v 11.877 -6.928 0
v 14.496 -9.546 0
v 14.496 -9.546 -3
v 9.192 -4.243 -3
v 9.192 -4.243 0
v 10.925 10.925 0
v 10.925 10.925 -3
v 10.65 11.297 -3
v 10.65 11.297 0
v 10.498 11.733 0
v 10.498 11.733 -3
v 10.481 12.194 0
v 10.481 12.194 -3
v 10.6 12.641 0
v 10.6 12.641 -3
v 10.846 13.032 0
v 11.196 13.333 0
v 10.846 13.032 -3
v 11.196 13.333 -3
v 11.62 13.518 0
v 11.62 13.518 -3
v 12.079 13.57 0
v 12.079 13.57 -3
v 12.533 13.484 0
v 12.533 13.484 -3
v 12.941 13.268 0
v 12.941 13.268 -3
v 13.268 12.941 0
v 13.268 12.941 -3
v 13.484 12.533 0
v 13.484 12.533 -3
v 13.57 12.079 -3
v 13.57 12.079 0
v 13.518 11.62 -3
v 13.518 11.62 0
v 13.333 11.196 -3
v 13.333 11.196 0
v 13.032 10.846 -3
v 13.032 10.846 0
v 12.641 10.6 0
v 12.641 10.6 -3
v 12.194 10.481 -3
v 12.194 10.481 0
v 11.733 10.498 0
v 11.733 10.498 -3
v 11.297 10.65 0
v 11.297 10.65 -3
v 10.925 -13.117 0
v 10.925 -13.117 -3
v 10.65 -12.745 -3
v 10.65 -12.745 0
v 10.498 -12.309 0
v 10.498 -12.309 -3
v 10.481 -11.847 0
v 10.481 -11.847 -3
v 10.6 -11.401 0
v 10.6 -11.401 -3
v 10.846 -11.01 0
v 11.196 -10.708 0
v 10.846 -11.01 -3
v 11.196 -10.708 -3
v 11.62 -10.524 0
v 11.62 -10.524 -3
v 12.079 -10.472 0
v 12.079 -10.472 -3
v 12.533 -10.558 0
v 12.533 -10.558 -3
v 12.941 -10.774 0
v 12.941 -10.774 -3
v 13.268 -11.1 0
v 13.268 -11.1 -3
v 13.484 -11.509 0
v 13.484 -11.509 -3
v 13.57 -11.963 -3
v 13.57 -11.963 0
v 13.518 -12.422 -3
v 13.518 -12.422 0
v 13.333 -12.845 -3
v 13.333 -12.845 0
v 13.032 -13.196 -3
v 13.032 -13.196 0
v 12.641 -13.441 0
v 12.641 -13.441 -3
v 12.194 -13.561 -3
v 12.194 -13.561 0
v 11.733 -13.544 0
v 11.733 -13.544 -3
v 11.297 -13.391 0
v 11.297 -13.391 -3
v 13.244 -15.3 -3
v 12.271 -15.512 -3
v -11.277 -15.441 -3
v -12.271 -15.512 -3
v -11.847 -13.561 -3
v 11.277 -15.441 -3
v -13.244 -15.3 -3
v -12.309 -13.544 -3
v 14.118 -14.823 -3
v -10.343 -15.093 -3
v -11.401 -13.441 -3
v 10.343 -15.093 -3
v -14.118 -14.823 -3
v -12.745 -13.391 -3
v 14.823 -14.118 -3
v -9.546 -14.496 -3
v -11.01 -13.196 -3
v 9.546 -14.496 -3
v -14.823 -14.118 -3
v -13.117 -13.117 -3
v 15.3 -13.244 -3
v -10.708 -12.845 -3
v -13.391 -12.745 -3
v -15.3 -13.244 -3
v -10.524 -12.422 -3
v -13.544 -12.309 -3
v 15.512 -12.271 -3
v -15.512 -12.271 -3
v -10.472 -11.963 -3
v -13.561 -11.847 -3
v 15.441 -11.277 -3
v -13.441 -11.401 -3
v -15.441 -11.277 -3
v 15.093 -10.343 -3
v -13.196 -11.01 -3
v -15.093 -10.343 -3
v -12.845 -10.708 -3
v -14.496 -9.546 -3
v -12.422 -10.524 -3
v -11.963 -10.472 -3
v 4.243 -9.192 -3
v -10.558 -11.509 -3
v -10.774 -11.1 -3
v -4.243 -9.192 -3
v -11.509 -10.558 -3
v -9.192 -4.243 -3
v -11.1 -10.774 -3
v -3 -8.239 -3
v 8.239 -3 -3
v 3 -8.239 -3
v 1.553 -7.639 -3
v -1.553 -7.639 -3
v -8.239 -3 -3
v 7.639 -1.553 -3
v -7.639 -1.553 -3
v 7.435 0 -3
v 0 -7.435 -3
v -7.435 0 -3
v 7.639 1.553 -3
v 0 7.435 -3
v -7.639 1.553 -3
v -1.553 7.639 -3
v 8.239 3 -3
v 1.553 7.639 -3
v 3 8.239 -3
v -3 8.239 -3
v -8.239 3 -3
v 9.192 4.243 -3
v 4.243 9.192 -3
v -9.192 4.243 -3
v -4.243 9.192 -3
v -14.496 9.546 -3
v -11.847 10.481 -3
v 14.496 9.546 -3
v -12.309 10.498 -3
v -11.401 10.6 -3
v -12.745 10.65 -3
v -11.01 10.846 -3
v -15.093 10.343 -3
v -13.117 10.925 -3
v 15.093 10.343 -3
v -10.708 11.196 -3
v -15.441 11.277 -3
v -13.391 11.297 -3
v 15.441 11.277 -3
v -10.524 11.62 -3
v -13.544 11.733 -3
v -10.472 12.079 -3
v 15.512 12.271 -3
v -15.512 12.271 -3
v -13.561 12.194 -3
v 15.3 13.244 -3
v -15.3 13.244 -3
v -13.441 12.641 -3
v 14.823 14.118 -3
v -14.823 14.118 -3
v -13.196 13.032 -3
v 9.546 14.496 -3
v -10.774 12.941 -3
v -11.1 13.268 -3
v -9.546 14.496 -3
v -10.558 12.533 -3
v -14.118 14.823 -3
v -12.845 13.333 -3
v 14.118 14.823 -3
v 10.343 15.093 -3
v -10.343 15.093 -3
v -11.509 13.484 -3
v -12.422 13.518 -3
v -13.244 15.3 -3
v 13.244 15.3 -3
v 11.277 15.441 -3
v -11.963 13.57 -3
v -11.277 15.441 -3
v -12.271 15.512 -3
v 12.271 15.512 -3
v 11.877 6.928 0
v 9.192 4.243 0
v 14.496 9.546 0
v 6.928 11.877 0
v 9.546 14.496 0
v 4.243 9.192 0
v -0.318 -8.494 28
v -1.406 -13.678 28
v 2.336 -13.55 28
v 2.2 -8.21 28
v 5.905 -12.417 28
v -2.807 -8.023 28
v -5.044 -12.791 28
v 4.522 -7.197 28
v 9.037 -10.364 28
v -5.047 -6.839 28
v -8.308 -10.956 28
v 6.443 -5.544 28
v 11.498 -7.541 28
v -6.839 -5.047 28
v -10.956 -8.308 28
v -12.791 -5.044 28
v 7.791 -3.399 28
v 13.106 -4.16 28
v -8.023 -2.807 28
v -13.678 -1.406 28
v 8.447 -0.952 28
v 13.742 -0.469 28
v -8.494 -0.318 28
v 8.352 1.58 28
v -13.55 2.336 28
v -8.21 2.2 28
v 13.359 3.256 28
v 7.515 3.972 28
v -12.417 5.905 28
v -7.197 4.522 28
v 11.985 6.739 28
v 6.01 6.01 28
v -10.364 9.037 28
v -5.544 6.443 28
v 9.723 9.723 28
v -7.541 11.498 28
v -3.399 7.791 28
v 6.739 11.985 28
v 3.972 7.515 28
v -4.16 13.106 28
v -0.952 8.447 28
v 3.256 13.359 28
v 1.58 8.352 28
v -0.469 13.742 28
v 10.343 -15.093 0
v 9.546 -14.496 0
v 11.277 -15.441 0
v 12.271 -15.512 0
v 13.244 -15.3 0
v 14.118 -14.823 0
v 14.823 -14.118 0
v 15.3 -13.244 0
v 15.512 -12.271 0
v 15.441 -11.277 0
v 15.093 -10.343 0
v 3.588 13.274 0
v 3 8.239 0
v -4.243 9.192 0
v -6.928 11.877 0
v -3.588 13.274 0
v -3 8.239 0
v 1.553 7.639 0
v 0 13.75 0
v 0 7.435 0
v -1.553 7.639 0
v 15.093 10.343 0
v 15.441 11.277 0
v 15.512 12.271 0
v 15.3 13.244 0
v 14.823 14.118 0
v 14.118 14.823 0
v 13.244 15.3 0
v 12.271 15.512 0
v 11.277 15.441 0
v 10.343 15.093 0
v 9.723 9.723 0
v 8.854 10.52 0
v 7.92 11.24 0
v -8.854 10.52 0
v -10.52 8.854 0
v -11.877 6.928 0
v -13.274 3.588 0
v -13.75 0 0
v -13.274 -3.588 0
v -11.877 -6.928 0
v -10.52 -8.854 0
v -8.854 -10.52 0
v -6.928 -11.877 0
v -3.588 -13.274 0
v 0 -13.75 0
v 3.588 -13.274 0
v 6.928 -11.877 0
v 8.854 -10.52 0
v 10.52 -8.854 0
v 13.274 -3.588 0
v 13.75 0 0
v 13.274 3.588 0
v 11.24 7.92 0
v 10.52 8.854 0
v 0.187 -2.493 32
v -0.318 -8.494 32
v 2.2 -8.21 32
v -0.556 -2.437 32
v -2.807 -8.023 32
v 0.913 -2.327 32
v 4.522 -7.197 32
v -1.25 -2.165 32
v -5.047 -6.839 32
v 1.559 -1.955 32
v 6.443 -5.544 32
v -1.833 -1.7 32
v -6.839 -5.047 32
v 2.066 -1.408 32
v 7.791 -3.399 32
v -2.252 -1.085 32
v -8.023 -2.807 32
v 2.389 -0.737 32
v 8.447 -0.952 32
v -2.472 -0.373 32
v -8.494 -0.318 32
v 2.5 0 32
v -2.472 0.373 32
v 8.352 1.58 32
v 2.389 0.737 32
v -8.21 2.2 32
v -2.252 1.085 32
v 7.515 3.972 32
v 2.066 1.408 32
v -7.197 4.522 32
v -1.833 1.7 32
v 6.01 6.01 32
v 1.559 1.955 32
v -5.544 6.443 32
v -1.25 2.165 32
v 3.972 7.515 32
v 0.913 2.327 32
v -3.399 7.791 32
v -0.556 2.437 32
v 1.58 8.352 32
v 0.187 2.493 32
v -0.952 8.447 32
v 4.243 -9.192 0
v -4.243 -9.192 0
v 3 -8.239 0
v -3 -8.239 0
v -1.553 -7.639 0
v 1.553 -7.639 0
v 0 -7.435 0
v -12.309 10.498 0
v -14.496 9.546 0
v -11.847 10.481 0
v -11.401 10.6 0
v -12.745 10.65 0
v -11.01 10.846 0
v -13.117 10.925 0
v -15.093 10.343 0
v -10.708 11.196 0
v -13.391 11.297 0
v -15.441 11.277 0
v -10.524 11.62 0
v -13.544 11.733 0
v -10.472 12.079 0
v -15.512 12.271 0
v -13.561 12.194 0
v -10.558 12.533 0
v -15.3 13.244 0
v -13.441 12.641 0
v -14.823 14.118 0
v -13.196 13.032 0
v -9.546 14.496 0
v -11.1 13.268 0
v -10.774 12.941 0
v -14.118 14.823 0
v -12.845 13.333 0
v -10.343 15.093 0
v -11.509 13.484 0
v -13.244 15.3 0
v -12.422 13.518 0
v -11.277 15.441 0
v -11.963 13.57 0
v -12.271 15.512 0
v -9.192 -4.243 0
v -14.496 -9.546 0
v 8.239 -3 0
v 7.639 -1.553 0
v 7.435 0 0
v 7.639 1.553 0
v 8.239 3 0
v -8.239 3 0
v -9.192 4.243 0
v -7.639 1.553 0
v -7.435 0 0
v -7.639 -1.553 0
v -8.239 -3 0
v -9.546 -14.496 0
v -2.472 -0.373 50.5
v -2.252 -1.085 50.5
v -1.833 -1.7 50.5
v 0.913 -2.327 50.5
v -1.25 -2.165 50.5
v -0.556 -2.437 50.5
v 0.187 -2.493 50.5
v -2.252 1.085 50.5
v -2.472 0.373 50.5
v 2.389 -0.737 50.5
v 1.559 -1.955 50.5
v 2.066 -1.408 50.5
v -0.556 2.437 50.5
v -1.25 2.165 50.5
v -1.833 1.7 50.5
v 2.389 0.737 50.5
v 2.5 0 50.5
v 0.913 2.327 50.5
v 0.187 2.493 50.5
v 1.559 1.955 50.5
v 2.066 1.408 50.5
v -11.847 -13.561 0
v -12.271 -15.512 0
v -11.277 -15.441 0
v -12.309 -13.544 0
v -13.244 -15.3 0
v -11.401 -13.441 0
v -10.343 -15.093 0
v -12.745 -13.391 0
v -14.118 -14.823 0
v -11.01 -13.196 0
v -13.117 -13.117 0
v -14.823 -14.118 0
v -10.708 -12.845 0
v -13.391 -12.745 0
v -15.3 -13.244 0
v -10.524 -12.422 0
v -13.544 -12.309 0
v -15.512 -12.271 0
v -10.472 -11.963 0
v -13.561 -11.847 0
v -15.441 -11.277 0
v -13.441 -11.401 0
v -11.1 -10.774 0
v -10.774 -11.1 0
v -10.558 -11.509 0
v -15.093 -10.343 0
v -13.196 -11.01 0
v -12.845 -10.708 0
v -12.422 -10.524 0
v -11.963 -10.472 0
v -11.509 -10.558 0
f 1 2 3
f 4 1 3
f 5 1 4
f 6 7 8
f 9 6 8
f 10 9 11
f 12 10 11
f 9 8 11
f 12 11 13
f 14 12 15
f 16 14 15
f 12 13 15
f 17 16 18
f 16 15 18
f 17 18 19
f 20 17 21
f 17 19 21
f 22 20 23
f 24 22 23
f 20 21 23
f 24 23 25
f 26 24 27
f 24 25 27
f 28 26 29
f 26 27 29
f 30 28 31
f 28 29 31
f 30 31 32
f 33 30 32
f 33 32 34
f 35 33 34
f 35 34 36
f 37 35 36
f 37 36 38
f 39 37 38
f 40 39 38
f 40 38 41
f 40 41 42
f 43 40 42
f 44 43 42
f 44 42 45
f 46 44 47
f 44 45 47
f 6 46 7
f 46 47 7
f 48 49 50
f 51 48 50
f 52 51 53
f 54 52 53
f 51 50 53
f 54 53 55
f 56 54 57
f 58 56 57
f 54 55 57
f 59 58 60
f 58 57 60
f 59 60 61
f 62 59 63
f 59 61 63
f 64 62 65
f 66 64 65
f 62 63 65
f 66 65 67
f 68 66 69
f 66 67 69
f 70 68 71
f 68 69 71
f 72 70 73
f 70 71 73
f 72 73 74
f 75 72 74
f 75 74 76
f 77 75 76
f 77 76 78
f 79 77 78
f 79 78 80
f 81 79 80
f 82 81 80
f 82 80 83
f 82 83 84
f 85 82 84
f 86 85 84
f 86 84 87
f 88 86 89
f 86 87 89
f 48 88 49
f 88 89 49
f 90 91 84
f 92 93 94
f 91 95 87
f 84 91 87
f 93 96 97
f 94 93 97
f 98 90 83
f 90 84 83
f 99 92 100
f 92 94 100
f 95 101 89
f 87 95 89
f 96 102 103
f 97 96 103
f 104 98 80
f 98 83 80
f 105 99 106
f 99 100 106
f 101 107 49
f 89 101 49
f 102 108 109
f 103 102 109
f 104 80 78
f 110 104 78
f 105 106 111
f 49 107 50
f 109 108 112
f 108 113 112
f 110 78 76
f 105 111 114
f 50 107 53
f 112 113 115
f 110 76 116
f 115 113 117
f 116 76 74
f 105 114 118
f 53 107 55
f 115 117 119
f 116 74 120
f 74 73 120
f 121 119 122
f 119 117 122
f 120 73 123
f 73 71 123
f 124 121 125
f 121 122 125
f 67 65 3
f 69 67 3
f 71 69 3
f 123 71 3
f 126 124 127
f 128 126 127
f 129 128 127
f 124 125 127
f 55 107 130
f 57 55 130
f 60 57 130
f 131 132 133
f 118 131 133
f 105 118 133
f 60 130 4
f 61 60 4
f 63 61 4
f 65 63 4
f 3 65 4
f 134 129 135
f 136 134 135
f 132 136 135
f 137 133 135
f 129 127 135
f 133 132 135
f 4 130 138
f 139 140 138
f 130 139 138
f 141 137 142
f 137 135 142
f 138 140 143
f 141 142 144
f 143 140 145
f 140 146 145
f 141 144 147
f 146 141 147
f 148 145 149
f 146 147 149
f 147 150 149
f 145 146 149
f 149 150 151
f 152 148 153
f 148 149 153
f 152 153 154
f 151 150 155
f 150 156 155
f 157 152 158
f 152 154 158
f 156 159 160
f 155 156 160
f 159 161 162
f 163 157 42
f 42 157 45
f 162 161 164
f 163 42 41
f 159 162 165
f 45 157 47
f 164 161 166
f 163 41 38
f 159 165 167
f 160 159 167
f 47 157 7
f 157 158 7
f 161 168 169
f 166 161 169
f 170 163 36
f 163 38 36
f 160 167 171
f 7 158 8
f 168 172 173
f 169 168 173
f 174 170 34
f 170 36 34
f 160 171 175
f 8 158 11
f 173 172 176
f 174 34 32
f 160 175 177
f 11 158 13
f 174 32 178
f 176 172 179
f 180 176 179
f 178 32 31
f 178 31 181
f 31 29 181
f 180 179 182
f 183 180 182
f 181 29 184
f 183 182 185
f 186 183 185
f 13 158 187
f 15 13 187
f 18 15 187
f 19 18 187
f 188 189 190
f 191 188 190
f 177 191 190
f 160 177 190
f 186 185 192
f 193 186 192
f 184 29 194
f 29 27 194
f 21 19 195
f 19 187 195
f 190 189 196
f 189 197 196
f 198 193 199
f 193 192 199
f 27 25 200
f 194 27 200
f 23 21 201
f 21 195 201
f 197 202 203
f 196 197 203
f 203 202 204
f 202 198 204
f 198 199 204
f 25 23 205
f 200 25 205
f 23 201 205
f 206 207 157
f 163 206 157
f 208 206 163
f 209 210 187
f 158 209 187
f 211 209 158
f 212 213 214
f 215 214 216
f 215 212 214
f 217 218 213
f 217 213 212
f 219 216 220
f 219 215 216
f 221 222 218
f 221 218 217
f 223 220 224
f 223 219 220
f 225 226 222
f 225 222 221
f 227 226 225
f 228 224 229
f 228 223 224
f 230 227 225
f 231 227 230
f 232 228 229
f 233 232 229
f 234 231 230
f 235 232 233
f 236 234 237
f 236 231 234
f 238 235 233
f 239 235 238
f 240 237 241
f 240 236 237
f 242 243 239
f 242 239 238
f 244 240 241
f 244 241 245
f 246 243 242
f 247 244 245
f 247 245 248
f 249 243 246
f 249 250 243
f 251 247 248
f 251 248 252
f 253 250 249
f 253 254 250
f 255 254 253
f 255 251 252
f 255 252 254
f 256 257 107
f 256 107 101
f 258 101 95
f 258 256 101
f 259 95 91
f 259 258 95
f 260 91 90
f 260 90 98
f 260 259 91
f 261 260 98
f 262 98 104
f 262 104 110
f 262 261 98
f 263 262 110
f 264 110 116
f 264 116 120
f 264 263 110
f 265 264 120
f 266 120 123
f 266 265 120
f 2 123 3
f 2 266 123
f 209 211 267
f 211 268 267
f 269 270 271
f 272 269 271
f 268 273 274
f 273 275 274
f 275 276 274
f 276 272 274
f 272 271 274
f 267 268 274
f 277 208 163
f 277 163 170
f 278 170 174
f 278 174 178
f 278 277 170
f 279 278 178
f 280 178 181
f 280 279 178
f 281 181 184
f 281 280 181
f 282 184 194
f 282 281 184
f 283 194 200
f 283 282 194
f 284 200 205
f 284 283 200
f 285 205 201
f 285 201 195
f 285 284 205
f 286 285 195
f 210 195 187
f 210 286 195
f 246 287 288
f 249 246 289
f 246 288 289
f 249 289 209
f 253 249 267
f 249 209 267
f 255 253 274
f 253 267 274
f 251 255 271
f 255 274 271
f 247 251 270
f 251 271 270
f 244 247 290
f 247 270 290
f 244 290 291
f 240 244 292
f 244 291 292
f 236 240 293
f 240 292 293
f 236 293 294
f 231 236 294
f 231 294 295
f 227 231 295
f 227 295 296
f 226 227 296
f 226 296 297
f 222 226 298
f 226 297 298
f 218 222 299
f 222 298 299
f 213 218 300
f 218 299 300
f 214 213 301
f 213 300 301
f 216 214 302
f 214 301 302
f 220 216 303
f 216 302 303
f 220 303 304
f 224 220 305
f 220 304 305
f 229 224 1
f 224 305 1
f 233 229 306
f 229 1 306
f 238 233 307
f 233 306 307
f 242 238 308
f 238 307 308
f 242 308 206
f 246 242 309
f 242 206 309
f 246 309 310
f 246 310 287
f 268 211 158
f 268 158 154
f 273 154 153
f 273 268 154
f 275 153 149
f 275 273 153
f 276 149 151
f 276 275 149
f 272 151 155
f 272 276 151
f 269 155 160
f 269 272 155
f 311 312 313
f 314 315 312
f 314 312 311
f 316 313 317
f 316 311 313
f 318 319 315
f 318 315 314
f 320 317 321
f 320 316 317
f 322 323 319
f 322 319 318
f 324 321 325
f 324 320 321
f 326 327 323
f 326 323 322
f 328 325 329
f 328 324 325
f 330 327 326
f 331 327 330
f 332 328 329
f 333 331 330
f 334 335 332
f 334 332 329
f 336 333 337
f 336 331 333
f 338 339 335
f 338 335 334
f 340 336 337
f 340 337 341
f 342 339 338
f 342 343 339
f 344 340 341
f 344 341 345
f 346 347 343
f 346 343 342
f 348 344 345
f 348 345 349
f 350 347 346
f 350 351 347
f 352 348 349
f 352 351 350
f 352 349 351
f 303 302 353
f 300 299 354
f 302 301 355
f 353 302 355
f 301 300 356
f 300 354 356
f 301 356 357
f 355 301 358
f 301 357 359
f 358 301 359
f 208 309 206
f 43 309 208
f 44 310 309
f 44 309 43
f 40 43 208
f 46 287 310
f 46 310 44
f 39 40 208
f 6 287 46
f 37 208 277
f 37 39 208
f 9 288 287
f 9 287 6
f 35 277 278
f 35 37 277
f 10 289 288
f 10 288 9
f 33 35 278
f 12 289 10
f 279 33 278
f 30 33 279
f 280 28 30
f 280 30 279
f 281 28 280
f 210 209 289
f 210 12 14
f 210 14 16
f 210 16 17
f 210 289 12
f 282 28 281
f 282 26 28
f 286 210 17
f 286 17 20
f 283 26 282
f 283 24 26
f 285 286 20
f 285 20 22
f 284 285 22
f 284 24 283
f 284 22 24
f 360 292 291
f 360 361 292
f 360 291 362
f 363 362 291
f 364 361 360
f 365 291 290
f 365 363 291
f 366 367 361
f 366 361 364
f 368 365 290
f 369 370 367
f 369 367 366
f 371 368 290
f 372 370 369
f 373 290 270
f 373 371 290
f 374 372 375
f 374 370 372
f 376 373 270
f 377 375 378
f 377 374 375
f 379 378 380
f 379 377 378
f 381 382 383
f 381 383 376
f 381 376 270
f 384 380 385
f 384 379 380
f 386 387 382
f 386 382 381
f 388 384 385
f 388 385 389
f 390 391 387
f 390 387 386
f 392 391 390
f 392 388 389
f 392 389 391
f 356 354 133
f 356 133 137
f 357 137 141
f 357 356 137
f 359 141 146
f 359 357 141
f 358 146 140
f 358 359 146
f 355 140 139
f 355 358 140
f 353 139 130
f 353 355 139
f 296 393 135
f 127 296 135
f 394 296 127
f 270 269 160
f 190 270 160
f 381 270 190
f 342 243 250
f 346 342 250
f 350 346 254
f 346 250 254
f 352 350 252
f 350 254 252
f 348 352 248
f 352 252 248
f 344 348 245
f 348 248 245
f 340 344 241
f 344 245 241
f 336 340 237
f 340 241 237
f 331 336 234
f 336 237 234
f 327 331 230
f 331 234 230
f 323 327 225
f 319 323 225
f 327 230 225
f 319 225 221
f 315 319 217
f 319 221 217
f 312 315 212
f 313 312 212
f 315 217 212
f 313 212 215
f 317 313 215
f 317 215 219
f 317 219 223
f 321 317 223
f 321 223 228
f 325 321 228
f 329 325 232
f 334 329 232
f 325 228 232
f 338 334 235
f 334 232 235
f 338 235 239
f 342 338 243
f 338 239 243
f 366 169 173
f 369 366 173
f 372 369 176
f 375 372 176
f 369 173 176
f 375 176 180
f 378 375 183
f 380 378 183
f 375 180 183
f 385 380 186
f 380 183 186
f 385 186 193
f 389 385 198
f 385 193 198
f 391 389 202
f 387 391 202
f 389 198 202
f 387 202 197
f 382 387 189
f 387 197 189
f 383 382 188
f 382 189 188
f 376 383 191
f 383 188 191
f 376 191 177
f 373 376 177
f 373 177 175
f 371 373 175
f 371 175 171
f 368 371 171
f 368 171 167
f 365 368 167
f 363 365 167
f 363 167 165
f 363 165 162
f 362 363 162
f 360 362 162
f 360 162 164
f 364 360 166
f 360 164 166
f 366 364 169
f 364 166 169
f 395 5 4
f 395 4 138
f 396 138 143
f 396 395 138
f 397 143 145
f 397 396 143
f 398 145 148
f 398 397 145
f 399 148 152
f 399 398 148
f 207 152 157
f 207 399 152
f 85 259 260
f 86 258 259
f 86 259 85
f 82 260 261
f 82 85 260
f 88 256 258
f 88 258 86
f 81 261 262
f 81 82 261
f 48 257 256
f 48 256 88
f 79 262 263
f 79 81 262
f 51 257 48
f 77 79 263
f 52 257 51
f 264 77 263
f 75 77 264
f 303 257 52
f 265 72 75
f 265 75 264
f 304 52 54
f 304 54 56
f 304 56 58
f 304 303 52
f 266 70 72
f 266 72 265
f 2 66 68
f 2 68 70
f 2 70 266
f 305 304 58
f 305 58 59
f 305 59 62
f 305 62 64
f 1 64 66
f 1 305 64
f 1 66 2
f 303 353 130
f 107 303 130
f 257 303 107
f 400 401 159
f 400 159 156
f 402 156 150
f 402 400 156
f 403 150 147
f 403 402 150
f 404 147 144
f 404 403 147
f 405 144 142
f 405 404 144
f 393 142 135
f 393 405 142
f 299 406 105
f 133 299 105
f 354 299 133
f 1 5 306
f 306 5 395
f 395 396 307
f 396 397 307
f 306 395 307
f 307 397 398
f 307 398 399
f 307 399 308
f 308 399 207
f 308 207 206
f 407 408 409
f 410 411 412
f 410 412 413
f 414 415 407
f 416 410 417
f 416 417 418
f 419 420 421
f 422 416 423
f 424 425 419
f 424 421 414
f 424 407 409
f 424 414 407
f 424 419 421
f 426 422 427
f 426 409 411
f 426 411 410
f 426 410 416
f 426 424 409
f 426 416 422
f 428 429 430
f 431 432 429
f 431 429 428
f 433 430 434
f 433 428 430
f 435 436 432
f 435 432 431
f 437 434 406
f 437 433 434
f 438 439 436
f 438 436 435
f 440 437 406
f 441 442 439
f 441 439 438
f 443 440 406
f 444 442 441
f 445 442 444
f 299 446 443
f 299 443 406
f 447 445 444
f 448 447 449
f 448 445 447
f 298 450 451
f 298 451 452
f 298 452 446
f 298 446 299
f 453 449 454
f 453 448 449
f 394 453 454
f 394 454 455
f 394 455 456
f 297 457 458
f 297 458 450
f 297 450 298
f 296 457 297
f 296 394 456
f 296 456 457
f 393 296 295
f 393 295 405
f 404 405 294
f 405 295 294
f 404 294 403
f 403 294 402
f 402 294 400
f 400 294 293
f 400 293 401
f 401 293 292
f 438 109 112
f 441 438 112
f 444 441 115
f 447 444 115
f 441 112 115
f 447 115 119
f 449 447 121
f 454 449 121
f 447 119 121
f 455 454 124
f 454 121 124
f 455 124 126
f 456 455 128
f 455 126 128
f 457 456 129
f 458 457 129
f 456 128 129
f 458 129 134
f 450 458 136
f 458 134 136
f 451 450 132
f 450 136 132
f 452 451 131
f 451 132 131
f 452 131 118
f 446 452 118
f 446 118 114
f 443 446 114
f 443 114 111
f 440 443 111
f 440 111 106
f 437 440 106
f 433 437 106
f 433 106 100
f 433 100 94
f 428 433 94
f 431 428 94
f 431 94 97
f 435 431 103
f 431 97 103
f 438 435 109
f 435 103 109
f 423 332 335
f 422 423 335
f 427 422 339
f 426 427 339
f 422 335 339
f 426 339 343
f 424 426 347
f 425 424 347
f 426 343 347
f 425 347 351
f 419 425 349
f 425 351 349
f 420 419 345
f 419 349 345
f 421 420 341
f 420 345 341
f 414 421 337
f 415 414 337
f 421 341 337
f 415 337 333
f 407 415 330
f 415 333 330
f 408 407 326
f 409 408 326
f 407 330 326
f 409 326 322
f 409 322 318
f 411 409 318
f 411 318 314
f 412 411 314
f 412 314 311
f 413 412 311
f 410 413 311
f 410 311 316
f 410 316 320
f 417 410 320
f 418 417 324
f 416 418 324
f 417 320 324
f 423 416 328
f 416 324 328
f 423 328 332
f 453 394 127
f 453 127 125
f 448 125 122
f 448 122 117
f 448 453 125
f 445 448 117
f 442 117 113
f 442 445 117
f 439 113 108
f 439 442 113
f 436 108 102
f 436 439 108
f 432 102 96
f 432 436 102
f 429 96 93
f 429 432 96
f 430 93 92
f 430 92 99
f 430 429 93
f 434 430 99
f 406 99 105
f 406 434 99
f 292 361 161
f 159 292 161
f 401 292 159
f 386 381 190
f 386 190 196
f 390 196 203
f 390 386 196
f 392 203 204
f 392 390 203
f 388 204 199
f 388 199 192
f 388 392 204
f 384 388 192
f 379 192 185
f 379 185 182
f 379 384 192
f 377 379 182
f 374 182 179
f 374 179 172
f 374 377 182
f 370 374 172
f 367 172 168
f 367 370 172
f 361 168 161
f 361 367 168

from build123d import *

# Parameters (mm, degrees)
SKETCH1_R             = 13.75
BOSS_EXTRUDE1_DEPTH   = 28
SKETCH2_R             = 8.5
BOSS_EXTRUDE2_DEPTH   = 4
BOSS_EXTRUDE3_DEPTH   = 3
SKETCH5_R             = 1.55
CUT_EXTRUDE1_DEPTH    = 3
BODY_MOVE_COPY1_ANGLE = 45
SKETCH6_R             = 2.5
BOSS_EXTRUDE4_DEPTH   = 18.5


with BuildPart() as part:
    # Sketch1 → Boss-Extrude1 (new body)
    with BuildSketch(Plane.XY):
        Circle(SKETCH1_R)
    extrude(amount=BOSS_EXTRUDE1_DEPTH)

    # Sketch2 → Boss-Extrude2 (add)
    with BuildSketch(Plane.XY.offset(28)):
        Circle(SKETCH2_R)
    extrude(amount=BOSS_EXTRUDE2_DEPTH)

    # Sketch4 → Boss-Extrude3 (add)
    with BuildSketch(Plane(origin=(0, 0, 0), x_dir=(-1, 0, 0), z_dir=(0, 0, -1))):
        with BuildLine():
            Line((-3.5, -17.000000602), (-3.5, -9.5))
            ThreePointArc((-3.5, -9.5), (-5.257359313, -5.257359313), (-9.5, -3.5))
            Line((-9.5, -3.5), (-17, -3.5))
            ThreePointArc((-17, -3.5), (-20.5, 0), (-17, 3.5))
            Line((-17, 3.5), (-9.5, 3.5))
            ThreePointArc((-9.5, 3.5), (-5.257359313, 5.257359313), (-3.5, 9.5))
            Line((-3.5, 9.5), (-3.5, 17.000000602))
            ThreePointArc((-3.5, 17.000000602), (0, 20.5), (3.5, 17.000000602))
            Line((3.5, 17.000000602), (3.5, 9.5))
            ThreePointArc((3.5, 9.5), (5.257359313, 5.257359313), (9.5, 3.5))
            Line((9.5, 3.5), (17, 3.5))
            ThreePointArc((17, 3.5), (20.5, 0), (17, -3.5))
            Line((17, -3.5), (9.5, -3.5))
            ThreePointArc((9.5, -3.5), (5.257359313, -5.257359313), (3.5, -9.5))
            Line((3.5, -9.5), (3.5, -17.000000602))
            ThreePointArc((3.5, -17.000000602), (0, -20.5), (-3.5, -17.000000602))
        make_face()
    extrude(amount=BOSS_EXTRUDE3_DEPTH)

    # Sketch5 → Cut-Extrude1 (cut)
    with BuildSketch(Plane(origin=(0, 0, -3), x_dir=(-1, 0, 0), z_dir=(0, 0, -1))):
        with Locations((0, 17)):
            Circle(SKETCH5_R)
        with Locations((17, 0)):
            Circle(SKETCH5_R)
        with Locations((0, -17)):
            Circle(SKETCH5_R)
        with Locations((-17, 0)):
            Circle(SKETCH5_R)
    extrude(amount=-CUT_EXTRUDE1_DEPTH, mode=Mode.SUBTRACT)


with BuildPart() as part_1:
    # Body-Move/Copy1: moved
    add(part.part.rotate(Axis((0, 0, 0), (0, 0, 1)), BODY_MOVE_COPY1_ANGLE))

    # Sketch6 → Boss-Extrude4 (add)
    with BuildSketch(Plane.XY.offset(32)):
        Circle(SKETCH6_R)
    extrude(amount=BOSS_EXTRUDE4_DEPTH)


solid = part_1.part
